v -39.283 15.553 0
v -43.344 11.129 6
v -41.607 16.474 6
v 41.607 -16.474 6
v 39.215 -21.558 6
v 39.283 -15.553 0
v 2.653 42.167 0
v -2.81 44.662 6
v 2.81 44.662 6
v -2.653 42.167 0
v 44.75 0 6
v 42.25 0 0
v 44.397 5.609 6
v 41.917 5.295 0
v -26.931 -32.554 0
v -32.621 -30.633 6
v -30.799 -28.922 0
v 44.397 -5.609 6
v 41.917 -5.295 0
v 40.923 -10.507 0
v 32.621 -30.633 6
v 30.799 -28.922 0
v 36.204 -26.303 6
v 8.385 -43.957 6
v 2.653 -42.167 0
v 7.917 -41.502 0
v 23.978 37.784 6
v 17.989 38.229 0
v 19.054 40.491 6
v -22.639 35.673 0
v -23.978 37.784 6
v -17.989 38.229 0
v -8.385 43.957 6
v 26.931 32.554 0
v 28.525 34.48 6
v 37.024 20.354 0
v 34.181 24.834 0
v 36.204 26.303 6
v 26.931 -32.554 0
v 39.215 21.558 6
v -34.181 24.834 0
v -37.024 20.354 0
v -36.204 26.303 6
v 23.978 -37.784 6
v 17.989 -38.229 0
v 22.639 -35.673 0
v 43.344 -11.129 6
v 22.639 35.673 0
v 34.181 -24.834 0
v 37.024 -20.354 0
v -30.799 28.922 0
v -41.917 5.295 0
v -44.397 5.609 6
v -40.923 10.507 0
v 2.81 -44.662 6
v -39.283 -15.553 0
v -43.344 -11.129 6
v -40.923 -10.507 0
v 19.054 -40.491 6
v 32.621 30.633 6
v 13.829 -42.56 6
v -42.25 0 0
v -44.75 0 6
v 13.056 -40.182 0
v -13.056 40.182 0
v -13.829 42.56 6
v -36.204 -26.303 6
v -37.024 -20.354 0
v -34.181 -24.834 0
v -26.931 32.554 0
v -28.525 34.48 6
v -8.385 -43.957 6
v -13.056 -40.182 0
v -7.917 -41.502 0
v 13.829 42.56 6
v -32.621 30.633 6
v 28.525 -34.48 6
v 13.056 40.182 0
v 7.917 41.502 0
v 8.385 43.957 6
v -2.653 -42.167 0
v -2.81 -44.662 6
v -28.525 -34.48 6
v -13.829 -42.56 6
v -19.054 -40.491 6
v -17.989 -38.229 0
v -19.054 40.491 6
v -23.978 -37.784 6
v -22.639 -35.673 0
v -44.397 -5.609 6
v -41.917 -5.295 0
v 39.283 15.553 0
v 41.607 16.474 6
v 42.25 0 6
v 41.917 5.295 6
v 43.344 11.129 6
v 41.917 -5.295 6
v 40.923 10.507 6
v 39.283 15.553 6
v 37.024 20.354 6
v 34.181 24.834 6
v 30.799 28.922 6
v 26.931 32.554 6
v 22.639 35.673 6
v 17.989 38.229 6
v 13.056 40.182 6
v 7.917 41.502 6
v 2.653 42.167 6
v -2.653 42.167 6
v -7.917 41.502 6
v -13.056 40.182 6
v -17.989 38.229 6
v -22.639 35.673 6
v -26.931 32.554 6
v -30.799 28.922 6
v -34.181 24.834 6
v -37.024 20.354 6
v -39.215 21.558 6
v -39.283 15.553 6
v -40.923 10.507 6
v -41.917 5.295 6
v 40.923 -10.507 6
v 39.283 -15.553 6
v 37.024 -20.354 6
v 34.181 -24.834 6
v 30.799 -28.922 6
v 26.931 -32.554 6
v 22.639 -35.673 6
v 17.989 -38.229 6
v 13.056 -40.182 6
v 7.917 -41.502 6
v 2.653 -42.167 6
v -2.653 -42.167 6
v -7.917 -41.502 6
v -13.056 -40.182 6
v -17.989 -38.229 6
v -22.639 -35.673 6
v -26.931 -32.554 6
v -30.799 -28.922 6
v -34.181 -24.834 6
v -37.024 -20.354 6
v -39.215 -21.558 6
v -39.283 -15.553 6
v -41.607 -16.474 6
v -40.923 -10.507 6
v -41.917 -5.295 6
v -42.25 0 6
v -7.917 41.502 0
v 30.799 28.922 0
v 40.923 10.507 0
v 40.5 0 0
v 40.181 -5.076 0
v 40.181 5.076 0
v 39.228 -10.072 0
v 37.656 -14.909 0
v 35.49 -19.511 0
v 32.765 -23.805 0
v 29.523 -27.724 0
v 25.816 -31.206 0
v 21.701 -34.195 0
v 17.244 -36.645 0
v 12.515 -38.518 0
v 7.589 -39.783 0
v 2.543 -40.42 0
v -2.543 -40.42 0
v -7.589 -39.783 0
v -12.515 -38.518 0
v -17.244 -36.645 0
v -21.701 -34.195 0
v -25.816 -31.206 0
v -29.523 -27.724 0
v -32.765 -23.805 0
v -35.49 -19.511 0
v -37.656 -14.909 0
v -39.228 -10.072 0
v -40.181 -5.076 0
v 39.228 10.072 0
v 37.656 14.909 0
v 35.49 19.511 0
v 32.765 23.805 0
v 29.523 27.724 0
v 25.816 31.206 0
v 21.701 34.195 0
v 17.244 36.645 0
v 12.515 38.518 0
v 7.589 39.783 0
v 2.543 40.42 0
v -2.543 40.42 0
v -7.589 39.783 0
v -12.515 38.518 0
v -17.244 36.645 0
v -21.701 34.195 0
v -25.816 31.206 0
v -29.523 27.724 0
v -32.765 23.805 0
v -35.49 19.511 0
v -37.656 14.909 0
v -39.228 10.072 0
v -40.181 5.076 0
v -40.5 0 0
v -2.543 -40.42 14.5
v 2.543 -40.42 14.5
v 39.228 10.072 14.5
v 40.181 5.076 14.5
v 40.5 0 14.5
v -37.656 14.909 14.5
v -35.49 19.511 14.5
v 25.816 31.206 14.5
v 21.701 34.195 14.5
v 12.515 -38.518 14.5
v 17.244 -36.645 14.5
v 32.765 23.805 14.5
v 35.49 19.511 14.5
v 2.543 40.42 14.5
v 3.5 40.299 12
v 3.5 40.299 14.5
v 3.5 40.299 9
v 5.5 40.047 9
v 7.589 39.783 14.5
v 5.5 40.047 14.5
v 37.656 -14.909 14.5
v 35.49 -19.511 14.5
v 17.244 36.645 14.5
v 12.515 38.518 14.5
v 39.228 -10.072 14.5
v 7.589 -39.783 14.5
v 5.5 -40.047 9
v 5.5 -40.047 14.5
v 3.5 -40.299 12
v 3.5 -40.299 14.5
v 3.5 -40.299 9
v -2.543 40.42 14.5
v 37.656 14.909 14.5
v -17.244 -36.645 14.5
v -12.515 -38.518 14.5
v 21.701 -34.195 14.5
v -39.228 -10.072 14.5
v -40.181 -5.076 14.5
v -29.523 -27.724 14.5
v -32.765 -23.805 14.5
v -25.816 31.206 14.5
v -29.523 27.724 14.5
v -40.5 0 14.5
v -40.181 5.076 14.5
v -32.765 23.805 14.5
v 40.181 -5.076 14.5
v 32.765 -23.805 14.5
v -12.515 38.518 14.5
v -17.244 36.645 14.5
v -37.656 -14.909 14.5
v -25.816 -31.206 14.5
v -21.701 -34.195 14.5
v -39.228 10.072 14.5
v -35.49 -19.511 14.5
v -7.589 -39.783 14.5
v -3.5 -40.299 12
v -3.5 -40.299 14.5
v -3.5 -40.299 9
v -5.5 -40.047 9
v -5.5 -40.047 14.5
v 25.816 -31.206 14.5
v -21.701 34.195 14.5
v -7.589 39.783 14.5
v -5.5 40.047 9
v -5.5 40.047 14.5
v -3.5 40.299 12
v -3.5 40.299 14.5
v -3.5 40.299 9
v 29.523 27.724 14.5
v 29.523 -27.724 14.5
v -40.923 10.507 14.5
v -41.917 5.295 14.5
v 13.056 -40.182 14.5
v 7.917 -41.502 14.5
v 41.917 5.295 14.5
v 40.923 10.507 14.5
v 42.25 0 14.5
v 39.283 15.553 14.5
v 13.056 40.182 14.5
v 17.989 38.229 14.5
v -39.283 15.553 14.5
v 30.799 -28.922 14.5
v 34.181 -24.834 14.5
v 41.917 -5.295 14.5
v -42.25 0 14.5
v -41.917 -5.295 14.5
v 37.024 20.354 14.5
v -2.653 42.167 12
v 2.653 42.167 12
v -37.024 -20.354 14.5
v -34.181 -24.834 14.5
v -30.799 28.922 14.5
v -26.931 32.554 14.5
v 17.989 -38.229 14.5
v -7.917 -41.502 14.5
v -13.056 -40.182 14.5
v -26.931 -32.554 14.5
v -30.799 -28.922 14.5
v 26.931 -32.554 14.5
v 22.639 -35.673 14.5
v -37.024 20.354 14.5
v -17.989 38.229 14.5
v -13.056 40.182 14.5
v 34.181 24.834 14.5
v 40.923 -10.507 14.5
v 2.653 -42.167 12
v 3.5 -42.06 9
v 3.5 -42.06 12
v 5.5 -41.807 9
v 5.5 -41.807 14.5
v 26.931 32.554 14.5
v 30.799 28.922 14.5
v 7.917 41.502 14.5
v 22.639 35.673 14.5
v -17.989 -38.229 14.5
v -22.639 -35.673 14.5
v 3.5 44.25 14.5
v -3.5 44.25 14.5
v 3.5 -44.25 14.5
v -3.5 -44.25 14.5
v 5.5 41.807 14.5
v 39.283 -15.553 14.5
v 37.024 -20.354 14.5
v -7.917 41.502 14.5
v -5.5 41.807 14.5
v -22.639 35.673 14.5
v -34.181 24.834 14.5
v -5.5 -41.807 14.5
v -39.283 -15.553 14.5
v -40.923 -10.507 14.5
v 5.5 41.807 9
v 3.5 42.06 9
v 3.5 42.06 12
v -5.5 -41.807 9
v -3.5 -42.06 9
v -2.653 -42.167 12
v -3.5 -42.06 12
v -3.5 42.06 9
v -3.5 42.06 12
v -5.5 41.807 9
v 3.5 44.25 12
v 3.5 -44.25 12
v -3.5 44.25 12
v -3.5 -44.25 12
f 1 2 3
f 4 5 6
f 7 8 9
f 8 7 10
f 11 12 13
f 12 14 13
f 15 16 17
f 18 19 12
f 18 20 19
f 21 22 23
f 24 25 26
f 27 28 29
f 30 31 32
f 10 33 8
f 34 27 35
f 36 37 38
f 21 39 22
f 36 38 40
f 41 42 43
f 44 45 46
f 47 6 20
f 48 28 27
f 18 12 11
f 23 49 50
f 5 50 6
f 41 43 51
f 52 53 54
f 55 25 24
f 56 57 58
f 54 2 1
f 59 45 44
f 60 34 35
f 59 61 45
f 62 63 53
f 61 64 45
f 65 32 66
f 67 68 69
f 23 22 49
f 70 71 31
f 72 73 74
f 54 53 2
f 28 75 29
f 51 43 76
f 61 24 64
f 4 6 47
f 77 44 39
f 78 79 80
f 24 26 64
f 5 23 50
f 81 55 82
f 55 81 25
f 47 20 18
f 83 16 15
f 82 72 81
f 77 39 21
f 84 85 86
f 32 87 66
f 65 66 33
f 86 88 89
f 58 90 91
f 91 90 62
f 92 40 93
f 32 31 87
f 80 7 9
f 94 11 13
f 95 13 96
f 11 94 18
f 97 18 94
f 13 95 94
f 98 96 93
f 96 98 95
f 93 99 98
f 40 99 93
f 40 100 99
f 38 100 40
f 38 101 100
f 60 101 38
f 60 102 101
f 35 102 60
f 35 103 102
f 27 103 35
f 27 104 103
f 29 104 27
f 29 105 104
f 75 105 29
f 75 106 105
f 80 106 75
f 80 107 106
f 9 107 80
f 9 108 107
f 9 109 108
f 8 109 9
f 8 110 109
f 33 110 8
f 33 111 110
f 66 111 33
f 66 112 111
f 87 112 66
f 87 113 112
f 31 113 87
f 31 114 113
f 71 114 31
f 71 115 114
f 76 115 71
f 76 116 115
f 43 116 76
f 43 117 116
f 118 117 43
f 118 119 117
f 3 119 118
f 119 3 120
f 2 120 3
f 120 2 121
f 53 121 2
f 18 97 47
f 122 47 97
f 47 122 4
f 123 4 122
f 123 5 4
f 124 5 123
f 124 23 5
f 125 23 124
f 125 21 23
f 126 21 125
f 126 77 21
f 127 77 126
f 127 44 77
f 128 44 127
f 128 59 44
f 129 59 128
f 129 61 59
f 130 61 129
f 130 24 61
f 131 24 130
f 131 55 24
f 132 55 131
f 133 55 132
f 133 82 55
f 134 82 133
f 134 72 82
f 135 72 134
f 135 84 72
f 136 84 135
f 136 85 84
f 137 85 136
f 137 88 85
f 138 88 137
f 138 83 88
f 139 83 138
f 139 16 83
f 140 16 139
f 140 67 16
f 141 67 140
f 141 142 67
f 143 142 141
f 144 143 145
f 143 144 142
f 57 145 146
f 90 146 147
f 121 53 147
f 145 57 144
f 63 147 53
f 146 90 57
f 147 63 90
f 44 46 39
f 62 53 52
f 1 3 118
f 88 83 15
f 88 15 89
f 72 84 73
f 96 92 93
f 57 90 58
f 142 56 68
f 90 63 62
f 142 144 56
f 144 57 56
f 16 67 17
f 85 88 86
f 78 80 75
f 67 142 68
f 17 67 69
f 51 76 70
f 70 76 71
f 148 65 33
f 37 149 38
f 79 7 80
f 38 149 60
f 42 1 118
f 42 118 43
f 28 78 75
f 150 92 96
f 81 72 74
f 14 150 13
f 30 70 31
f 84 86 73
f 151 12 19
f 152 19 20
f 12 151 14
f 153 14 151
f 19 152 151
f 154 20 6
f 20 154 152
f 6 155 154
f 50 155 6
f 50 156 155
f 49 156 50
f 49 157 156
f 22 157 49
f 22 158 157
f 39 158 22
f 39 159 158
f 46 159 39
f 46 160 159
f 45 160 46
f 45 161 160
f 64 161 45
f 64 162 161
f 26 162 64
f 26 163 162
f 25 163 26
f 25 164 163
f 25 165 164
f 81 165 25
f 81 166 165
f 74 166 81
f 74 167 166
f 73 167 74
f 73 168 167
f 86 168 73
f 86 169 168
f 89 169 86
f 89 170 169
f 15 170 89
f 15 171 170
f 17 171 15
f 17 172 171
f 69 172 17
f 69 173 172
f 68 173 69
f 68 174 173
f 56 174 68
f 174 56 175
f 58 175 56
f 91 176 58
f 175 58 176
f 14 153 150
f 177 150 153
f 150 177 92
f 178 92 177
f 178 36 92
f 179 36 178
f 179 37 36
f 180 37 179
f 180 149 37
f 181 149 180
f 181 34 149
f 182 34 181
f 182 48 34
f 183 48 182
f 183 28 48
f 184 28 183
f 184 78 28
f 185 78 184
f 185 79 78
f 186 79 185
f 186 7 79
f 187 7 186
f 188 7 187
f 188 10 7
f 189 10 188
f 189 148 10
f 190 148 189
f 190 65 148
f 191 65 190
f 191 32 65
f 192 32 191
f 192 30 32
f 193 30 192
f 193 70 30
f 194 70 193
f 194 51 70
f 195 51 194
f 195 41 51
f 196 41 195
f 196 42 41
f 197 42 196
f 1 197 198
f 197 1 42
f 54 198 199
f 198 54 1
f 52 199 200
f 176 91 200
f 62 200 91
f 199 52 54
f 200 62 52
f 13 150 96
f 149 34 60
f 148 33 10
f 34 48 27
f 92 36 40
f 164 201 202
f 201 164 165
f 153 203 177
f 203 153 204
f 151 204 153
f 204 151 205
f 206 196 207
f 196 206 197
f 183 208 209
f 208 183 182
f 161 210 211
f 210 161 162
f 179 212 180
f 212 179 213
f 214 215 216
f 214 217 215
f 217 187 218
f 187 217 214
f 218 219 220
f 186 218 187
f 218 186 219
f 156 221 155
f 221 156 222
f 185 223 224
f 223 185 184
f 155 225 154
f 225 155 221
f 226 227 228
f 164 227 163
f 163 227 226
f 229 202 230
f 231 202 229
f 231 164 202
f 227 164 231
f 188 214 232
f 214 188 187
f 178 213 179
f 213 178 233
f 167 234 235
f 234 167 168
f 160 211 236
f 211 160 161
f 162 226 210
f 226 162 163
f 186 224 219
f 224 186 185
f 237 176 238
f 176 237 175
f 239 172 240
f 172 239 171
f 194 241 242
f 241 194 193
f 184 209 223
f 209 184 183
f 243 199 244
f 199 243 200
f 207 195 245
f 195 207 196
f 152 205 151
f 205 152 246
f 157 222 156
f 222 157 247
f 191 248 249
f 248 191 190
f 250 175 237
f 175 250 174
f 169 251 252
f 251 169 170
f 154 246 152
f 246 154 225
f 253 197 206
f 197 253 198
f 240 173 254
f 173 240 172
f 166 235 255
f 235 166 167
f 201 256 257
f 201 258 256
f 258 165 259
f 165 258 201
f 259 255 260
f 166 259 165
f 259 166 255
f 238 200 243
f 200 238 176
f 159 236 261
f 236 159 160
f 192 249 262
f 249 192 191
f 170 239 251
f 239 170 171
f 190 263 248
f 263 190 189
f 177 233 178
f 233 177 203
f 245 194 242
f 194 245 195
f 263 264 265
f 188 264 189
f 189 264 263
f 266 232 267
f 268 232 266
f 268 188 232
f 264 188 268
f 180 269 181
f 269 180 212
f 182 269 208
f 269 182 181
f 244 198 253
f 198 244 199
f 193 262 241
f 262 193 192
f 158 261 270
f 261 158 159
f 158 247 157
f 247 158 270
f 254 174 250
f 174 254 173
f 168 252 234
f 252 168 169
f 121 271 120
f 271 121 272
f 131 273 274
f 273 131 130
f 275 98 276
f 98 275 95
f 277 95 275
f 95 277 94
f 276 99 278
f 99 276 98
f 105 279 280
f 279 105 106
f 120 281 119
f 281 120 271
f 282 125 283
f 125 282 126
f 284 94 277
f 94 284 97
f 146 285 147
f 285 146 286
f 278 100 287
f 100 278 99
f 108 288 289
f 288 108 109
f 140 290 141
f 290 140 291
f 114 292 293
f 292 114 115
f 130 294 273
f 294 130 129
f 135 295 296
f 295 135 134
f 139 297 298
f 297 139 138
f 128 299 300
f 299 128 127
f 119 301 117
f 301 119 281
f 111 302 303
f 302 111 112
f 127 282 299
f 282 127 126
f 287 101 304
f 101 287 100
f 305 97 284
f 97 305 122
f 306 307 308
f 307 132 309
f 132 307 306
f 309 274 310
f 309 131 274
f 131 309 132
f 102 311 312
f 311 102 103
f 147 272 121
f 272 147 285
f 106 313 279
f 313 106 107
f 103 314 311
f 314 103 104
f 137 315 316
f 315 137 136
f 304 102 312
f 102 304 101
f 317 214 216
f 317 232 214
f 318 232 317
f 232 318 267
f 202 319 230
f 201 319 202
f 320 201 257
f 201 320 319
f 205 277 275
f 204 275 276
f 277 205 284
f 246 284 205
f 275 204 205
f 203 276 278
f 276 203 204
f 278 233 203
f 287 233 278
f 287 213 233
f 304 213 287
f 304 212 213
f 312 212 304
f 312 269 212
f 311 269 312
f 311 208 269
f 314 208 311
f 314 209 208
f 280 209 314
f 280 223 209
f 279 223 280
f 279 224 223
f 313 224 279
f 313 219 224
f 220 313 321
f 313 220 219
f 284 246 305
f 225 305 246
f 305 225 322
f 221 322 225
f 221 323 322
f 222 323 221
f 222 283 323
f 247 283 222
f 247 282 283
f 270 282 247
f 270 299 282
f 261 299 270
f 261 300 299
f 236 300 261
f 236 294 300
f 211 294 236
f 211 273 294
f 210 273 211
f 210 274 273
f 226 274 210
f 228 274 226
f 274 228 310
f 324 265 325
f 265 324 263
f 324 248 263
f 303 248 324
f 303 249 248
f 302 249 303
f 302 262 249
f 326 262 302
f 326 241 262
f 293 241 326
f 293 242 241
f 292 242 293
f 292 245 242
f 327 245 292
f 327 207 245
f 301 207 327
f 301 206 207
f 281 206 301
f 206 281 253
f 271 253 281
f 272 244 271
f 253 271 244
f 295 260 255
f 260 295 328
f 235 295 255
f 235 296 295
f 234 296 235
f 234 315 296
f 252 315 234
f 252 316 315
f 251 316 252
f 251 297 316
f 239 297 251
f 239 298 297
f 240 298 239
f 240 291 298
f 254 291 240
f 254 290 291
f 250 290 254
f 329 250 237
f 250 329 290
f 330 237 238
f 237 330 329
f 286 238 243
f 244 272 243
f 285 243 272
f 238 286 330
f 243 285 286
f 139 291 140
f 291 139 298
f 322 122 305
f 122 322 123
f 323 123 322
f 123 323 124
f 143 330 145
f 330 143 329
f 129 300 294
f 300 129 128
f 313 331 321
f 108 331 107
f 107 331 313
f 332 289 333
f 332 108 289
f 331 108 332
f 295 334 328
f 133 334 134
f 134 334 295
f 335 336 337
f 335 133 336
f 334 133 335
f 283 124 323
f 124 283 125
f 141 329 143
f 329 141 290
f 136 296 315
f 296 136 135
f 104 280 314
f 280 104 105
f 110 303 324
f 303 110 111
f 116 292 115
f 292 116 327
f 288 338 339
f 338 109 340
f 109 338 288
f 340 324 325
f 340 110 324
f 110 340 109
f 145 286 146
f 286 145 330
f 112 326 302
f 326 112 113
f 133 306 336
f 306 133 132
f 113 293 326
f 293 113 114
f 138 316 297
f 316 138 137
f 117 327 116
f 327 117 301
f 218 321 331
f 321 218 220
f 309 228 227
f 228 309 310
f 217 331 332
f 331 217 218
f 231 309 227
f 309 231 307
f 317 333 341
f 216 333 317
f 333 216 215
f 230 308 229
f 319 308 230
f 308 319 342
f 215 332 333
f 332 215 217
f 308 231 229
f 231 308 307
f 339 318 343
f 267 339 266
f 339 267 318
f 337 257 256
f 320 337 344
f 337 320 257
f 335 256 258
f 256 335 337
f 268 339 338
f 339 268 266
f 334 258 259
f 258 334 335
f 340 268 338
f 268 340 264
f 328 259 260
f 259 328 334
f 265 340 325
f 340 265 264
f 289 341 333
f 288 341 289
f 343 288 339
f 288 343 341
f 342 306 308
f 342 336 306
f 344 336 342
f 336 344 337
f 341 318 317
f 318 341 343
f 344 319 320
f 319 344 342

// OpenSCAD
quality = 50;				// Quality of curves
outer_diameter = 40.5;	// Diameter of central thread (add d1 for max diameter )
wall_thickness = 1.75;	// Thickness of outer cuff wall
slot_depth = 5.5;			// Depth of tab slot	
slot_width = 2;			// Width of tab slot
tab_height = 2.5;			// Height of tab
tab_length = 2;			// Length (depth) of tab
tab_width = 7;				// Width of tab
body_height = 8.5;		// Height of main body
end_overhang = 2.5;		// Radius of end overhang
end_height = 6;			// Height of end ring

union() {
	difference() {
		union() {
			difference() {
				cylinder( end_height, outer_diameter + wall_thickness, outer_diameter + wall_thickness + end_overhang, $fn = quality );
				translate( [ 0, 0, -1 ] )
				cylinder( end_height + 2, outer_diameter, outer_diameter, $fn = quality );
			}
			translate( [ 0, 0, end_height ] )
			difference() {
				cylinder( body_height, outer_diameter + wall_thickness, outer_diameter + wall_thickness, $fn = quality );
				translate( [ 0, 0, -1 ] )
				cylinder( body_height + 2, outer_diameter, outer_diameter, $fn = quality );
			}
		}
		translate( [ ( tab_width / 2 ), - ( outer_diameter + wall_thickness ), ( body_height + end_height ) - slot_depth ] )
		cube( [ slot_width , ( outer_diameter + wall_thickness + 1 ) * 2, slot_depth + 1 ] );
		translate( [ - ( ( tab_width / 2 ) + slot_width ), -( outer_diameter + wall_thickness ), ( body_height + end_height ) - slot_depth ] )
		cube( [ slot_width , ( outer_diameter + wall_thickness + 1 ) * 2, slot_depth + 1 ] );
	}
	difference() {
		translate( [ - ( tab_width / 2 ), - ( outer_diameter + wall_thickness + tab_length ), ( body_height + end_height ) - tab_height ] )
		cube( [ tab_width, ( outer_diameter + wall_thickness + tab_length ) * 2, tab_height ] );
		cylinder( 20, outer_diameter, outer_diameter, $fn = quality );
	}
}
